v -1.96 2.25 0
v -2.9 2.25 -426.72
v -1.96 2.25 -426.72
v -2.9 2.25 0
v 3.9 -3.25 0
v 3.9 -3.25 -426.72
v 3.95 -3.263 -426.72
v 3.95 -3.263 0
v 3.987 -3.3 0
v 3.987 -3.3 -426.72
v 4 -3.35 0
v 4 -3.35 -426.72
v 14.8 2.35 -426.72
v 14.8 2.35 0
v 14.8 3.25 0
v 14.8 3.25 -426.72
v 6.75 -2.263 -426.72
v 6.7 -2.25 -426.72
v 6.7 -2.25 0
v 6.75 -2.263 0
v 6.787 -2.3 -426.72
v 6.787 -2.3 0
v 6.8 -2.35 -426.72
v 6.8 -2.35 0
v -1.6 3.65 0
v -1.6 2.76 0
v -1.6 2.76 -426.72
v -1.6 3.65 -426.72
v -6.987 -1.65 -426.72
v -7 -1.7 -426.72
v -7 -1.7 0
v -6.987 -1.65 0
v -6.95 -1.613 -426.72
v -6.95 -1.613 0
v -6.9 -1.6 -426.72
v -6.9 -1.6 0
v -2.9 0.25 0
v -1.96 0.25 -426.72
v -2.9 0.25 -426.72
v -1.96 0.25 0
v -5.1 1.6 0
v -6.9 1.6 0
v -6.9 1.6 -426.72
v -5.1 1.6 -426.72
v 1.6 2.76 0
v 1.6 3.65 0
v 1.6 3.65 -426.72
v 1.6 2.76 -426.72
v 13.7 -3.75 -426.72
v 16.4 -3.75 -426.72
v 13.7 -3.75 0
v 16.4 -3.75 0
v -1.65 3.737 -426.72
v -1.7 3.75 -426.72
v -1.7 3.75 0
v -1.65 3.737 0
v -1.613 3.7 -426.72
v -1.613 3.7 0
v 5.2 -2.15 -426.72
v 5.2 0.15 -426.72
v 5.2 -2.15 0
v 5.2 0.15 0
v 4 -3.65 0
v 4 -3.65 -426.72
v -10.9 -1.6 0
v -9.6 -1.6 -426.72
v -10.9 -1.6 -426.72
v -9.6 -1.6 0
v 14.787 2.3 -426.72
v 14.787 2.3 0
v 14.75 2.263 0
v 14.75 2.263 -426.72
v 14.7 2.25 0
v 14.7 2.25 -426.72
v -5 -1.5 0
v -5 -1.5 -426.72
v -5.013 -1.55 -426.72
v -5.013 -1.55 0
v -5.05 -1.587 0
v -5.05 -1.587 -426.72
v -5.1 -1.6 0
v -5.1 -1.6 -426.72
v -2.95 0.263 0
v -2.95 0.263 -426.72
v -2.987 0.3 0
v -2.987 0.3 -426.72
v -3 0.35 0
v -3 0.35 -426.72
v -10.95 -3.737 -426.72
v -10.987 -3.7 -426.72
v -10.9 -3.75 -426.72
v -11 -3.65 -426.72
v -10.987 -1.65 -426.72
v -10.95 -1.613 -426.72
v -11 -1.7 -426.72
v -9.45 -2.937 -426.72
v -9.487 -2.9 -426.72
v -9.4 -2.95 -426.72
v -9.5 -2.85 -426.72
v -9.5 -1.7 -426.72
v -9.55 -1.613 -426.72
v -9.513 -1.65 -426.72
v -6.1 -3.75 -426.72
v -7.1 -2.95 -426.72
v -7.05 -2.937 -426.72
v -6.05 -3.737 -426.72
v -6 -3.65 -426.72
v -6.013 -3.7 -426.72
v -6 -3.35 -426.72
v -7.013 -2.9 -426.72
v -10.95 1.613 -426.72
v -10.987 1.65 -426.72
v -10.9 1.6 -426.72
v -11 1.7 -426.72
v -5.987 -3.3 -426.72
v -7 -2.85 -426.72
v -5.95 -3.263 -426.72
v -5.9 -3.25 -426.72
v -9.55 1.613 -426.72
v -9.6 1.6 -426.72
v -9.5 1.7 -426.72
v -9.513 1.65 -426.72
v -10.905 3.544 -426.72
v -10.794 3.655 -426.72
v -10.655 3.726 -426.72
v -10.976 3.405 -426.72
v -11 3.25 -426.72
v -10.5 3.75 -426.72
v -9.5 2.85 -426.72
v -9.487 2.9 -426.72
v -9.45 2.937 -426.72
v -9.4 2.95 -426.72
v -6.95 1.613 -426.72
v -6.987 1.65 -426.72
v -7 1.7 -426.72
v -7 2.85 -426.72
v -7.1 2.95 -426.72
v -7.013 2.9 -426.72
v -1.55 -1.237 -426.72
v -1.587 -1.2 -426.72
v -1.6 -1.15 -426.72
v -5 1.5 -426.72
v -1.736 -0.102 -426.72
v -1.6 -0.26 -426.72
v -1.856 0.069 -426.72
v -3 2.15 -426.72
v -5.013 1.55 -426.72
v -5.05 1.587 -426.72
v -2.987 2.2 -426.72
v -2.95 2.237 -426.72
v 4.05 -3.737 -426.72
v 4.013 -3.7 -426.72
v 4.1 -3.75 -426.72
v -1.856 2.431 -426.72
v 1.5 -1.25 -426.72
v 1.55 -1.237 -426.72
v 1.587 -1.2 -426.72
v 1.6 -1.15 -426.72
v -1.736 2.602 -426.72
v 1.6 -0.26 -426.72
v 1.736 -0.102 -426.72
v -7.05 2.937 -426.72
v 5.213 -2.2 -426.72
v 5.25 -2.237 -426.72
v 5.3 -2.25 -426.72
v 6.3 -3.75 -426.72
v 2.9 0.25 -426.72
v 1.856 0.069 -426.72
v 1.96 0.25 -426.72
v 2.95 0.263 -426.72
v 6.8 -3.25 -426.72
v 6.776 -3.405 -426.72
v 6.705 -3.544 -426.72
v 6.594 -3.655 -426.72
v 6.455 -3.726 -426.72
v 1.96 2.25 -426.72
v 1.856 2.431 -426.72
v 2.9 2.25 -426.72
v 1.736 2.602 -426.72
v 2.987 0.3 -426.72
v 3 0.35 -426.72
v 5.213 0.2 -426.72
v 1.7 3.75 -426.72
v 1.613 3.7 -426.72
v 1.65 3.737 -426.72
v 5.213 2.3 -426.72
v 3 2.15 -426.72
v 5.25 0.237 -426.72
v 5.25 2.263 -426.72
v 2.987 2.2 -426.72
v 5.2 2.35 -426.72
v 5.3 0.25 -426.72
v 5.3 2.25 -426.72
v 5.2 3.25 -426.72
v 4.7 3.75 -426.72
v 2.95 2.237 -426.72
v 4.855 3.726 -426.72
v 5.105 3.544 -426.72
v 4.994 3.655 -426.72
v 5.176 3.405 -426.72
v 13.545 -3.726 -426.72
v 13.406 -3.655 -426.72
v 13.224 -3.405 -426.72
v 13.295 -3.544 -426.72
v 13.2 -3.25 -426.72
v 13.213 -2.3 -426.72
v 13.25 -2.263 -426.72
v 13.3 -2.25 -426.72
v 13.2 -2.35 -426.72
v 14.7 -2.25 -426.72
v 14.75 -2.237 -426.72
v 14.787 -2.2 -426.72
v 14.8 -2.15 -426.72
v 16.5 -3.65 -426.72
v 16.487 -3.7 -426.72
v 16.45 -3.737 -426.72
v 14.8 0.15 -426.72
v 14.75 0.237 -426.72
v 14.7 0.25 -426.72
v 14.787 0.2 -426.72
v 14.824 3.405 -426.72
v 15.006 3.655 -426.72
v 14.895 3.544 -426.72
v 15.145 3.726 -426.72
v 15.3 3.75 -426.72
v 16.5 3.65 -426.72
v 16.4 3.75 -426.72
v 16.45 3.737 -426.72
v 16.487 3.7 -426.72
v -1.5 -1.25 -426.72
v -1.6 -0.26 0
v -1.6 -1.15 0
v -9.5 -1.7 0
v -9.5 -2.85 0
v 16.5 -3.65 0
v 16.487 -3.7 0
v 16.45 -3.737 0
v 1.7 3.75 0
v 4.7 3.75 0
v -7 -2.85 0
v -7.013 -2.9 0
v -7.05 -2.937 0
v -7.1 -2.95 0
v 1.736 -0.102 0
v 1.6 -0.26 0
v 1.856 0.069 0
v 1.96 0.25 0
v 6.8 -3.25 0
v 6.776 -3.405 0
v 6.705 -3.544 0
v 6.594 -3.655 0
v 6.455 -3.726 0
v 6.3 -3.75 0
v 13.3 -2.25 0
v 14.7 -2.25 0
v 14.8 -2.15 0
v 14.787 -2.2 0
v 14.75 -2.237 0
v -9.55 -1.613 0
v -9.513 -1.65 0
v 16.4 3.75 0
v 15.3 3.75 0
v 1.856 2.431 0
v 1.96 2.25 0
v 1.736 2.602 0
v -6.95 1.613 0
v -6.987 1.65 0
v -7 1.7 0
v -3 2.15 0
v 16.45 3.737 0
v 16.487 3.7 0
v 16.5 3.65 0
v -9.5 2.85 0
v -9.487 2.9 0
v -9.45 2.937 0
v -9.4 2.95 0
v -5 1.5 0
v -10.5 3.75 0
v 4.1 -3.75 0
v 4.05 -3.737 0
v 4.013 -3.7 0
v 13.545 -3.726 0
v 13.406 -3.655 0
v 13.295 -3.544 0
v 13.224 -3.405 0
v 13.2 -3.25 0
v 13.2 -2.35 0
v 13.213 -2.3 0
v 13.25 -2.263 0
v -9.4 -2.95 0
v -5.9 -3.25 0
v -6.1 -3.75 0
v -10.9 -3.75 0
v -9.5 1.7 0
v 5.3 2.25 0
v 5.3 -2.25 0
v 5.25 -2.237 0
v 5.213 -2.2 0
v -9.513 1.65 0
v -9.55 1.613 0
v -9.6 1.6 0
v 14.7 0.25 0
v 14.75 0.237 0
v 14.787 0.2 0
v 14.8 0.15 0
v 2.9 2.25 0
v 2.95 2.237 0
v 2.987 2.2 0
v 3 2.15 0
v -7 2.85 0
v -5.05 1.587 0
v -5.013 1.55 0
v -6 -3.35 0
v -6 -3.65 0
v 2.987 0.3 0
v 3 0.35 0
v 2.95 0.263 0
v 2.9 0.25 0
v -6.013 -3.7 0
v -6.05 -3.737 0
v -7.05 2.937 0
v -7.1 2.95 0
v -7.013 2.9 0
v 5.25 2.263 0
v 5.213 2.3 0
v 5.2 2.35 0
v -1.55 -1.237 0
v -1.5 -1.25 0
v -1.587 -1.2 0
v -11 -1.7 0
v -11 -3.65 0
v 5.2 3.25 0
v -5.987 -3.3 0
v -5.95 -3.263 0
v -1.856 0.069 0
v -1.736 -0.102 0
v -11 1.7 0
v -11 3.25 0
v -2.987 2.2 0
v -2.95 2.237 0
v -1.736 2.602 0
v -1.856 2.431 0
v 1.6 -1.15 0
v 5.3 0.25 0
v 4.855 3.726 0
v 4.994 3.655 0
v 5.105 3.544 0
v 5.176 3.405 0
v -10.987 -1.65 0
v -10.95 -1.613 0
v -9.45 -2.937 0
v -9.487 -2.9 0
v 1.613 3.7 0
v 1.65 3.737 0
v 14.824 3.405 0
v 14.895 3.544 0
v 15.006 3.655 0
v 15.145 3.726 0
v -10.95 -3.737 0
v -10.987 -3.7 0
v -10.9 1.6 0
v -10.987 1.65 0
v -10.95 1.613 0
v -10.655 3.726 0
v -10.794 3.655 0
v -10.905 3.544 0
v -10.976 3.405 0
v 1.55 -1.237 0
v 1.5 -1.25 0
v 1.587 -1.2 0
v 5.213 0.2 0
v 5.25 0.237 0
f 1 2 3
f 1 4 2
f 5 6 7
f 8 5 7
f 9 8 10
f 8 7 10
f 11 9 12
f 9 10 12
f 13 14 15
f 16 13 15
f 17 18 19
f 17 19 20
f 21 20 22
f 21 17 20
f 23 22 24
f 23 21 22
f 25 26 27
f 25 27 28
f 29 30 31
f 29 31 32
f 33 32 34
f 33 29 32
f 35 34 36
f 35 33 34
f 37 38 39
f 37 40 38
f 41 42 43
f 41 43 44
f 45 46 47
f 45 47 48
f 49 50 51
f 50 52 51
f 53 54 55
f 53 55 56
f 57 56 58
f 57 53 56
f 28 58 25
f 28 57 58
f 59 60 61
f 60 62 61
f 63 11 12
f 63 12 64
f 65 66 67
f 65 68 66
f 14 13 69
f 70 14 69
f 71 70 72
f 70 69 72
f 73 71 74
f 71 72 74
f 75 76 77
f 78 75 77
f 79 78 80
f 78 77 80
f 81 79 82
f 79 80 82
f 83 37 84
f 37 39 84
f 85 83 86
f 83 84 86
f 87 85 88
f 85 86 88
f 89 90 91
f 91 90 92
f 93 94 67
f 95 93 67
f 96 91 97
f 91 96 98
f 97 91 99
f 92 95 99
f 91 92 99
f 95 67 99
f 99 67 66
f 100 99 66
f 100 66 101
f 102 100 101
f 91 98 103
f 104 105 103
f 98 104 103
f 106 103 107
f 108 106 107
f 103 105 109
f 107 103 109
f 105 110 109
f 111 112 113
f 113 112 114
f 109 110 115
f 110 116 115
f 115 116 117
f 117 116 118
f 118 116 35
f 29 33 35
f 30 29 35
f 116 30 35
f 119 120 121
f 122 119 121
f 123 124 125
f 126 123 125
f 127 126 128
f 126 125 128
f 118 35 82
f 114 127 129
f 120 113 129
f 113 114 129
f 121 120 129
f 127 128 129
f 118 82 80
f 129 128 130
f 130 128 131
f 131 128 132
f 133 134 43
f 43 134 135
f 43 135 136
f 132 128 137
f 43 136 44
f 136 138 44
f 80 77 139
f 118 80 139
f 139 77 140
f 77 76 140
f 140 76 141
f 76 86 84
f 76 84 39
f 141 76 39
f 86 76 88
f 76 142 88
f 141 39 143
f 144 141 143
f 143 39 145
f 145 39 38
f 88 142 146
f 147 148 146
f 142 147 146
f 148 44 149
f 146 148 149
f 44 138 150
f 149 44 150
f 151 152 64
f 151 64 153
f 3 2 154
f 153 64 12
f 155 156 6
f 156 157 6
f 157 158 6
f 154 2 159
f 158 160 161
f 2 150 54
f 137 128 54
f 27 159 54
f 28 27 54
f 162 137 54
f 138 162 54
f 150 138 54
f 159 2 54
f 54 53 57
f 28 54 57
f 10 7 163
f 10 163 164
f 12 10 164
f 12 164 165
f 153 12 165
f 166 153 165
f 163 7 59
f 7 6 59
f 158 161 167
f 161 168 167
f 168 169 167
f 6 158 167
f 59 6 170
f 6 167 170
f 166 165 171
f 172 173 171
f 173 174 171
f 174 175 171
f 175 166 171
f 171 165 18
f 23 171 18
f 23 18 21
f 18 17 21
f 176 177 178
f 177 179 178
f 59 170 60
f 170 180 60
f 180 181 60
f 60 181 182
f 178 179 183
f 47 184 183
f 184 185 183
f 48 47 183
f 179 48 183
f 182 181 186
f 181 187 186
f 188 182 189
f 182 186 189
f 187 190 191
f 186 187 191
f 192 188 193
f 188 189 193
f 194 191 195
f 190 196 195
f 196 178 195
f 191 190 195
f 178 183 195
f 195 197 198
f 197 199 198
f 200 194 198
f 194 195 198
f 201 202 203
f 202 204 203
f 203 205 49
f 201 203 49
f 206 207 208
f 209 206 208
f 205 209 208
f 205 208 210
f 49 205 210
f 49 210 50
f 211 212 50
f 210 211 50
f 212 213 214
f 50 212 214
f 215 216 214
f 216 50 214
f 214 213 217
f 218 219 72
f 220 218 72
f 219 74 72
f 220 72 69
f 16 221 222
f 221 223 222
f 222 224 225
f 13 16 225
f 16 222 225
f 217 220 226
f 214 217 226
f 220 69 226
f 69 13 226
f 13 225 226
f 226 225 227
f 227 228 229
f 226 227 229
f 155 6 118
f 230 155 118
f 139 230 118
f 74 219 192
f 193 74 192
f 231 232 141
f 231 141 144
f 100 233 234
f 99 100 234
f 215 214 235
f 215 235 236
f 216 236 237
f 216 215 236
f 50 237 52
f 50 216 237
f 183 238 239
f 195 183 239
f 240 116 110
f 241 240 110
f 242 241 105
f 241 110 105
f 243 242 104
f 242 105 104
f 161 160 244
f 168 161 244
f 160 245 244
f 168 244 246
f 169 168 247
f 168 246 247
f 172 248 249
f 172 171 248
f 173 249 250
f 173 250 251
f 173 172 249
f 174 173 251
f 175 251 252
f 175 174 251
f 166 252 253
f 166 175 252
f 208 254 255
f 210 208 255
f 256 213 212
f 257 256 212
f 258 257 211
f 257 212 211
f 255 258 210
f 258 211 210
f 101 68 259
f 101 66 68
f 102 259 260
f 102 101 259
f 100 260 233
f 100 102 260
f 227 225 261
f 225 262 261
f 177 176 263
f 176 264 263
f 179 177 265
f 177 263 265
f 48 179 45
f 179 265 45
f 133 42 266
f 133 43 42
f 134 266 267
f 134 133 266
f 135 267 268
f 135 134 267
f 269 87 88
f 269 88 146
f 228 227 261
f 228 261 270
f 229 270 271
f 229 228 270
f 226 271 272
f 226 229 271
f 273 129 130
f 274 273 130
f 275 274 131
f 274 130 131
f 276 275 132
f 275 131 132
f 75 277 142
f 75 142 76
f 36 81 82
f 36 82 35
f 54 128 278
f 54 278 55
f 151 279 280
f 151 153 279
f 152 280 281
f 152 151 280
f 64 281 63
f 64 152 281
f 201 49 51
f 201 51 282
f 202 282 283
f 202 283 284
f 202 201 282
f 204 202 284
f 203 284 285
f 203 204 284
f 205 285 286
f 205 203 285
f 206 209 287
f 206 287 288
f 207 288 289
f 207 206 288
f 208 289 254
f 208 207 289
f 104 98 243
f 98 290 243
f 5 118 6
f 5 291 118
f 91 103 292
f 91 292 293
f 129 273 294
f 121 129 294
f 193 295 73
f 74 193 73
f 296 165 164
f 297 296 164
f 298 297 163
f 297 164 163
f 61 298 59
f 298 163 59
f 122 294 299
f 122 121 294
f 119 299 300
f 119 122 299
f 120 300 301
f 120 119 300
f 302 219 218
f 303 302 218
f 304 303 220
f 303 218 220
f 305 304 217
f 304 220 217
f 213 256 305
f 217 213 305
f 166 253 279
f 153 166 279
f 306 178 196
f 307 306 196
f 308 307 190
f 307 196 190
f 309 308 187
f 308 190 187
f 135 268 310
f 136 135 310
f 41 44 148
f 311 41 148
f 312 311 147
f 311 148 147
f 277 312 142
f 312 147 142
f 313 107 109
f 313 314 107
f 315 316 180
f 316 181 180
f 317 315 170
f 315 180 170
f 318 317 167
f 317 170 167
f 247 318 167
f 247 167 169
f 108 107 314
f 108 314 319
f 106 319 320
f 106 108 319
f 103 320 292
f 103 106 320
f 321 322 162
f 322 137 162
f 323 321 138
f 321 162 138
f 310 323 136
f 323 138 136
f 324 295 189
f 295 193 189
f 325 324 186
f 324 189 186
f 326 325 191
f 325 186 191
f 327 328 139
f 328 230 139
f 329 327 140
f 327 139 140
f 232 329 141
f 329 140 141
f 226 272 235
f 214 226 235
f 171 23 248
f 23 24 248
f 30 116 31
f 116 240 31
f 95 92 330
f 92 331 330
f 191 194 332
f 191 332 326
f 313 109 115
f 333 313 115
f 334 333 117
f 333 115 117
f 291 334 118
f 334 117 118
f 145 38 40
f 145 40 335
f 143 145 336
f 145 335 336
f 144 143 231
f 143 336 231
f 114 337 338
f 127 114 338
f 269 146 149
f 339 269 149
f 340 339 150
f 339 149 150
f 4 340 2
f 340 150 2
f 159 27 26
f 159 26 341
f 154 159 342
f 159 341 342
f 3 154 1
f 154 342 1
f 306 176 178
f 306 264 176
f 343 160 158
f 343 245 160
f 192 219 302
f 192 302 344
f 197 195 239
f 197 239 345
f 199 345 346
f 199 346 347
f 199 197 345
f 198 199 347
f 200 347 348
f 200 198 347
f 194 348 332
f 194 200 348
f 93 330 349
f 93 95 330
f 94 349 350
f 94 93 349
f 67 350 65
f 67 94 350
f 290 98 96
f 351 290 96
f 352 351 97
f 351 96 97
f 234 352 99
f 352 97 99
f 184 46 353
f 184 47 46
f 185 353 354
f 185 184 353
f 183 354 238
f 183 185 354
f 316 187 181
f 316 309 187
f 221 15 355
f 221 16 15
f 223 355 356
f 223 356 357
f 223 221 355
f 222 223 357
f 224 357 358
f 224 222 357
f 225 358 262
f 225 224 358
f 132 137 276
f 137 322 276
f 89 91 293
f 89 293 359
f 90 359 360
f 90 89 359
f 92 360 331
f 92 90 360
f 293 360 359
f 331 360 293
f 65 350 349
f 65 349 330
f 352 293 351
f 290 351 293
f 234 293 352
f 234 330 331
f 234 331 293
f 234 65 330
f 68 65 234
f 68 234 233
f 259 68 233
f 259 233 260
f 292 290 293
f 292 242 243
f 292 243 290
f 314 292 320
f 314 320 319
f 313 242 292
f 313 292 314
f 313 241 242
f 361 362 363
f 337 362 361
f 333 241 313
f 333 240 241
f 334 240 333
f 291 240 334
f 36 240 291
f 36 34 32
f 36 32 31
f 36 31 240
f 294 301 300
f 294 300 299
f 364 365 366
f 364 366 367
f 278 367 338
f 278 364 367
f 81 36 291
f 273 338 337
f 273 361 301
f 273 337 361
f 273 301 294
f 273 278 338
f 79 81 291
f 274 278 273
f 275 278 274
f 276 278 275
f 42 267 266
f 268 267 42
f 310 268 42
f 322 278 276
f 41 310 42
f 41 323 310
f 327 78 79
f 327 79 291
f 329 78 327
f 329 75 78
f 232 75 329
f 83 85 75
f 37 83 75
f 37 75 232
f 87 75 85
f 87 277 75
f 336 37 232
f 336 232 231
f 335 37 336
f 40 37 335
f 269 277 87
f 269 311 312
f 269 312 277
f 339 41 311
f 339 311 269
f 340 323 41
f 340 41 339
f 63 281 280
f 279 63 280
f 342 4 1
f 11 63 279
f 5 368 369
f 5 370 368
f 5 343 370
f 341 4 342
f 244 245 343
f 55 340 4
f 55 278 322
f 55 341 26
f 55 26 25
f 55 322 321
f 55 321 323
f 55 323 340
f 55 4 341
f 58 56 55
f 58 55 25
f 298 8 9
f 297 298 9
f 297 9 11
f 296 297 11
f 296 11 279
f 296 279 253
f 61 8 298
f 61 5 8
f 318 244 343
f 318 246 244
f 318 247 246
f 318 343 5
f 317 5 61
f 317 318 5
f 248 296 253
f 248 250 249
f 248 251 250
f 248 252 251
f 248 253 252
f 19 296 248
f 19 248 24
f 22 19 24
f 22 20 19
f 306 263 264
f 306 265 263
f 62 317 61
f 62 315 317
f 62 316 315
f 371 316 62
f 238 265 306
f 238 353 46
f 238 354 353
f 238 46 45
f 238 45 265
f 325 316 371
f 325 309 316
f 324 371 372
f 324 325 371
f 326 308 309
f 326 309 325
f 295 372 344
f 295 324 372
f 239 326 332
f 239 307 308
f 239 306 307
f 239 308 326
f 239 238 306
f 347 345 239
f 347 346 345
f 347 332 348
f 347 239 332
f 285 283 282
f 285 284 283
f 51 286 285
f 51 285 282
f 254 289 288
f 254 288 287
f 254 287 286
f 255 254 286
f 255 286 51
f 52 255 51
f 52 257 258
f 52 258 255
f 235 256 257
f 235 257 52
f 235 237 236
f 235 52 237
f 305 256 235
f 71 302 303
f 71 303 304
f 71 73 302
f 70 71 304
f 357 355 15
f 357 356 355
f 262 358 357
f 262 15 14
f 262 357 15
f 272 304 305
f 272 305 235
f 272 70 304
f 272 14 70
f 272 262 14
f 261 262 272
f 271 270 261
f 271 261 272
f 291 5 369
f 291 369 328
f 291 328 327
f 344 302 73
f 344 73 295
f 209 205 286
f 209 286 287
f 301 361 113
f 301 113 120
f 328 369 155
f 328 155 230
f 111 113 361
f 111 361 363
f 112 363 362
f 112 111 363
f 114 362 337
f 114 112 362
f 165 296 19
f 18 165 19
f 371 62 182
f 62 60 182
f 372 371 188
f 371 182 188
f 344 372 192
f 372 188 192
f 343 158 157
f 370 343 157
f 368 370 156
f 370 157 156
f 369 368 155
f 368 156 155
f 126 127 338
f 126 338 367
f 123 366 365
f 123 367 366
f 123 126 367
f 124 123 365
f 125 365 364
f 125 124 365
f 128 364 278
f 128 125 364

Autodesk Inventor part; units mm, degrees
ref_plane "YZ Plane" through (0, 0, 0) normal (1, 0, 0) x (0, 1, 0)
ref_plane "XZ Plane" through (0, 0, 0) normal (0, 1, 0) x (-1, 0, 0)
ref_plane "XY Plane" through (0, 0, 0) normal (0, 0, 1) x (1, 0, 0)
sketch "Rail_TypeB_Sketch" plane through (0, 0, 0) normal (0, 0, 1) x (1, 0, 0)
  line L0 (-11, 3.75) -> (-1.6, 3.75)
  line L1 (16.5, 3.75) -> (16.5, -3.75)
  line L2 (16.5, -3.75) -> (13.2, -3.75)
  line L3 (-11, -3.75) -> (-11, -1.6)
  arc A0 (-1.9596, 2.25) -> (-1.9596, 0.25) centre (0, 1.25) ccw construction
  line L4 (-11, 0) -> (16.5, 0) construction
  line L5 (0, 3.75) -> (0, -3.75) construction
  line L6 (-11, 1.6) -> (-9.5, 1.6)
  line L7 (-5, 1.6) -> (-5, -1.6)
  line L8 (-5, -1.6) -> (-7, -1.6)
  line L9 (-11, 1.6) -> (-11, 3.75)
  line L10 (-11, -1.6) -> (-11, 1.6) construction
  line L11 (-7, 2.95) -> (-9.5, 2.95)
  line L12 (-9.5, 2.95) -> (-9.5, 1.6)
  line L13 (-9.5, -2.95) -> (-7, -2.95)
  line L14 (-7, -2.95) -> (-7, -1.6)
  line L15 (-9.5, 1.6) -> (-7, 1.6) construction
  line L16 (-7, 1.6) -> (-5, 1.6)
  line L17 (-9.5, -1.6) -> (-11, -1.6)
  line L18 (-7, -1.6) -> (-9.5, -1.6) construction
  line L19 (-7, -1.6) -> (-7, 1.6) construction
  line L20 (-9.5, -1.6) -> (-9.5, -2.95)
  line L21 (-9.5, 1.6) -> (-9.5, -1.6) construction
  line L22 (-7, 1.6) -> (-7, 2.95)
  line L23 (-6, -3.75) -> (-6, -3.25)
  line L24 (-6, -3.25) -> (4, -3.25)
  line L25 (4, -3.25) -> (4, -3.75)
  line L26 (-6, -3.75) -> (-11, -3.75)
  line L27 (4, -3.75) -> (-6, -3.75) construction
  line L28 (1.6, -1.25) -> (-1.6, -1.25)
  line L29 (-1.6, -1.25) -> (-1.6, -0.26)
  line L30 (1.6, 3.75) -> (1.6, 2.76)
  line L31 (1.6, -1.25) -> (-1.6, 3.75) construction
  line L32 (-1.6, -1.25) -> (1.6, 3.75) construction
  line L33 (-3, 2.25) -> (-1.9596, 2.25)
  line L34 (3, 2.25) -> (3, 0.25)
  line L35 (3, 0.25) -> (1.9596, 0.25)
  line L36 (-3, 0.25) -> (-3, 2.25)
  line L37 (-3, 2.25) -> (3, 0.25) construction
  line L38 (3, 2.25) -> (-3, 0.25) construction
  arc A1 (-1.6, 2.76) -> (-1.9596, 2.25) centre (0, 1.25) ccw
  arc A2 (1.9596, 2.25) -> (1.6, 2.76) centre (0, 1.25) ccw
  arc A3 (1.6, 2.76) -> (-1.6, 2.76) centre (0, 1.25) ccw construction
  arc A4 (1.9596, 0.25) -> (1.9596, 2.25) centre (0, 1.25) ccw construction
  arc A5 (1.6, -0.26) -> (1.9596, 0.25) centre (0, 1.25) ccw
  arc A6 (-1.6, -0.26) -> (1.6, -0.26) centre (0, 1.25) ccw construction
  arc A7 (-1.9596, 0.25) -> (-1.6, -0.26) centre (0, 1.25) ccw
  line L39 (-1.9596, 2.25) -> (1.9596, 2.25) construction
  line L40 (-1.9596, 0.25) -> (-3, 0.25)
  line L41 (1.9596, 2.25) -> (3, 2.25)
  line L42 (1.9596, 0.25) -> (-1.9596, 0.25) construction
  line L43 (-1.6, 2.76) -> (-1.6, 3.75)
  line L44 (1.6, 2.76) -> (1.6, -0.26) construction
  line L45 (1.6, -0.26) -> (1.6, -1.25)
  line L46 (-1.6, -0.26) -> (-1.6, 2.76) construction
  line L47 (10, 3.75) -> (10, -3.75) construction
  line L48 (5.2, 3.75) -> (5.2, 2.25)
  line L49 (5.2, 2.25) -> (14.8, 2.25)
  line L50 (14.8, 2.25) -> (14.8, 3.75)
  line L51 (5.2, 3.75) -> (14.8, 3.75) construction
  line L52 (14.8, 3.75) -> (16.5, 3.75)
  line L53 (13.2, -3.75) -> (13.2, -2.25)
  line L54 (13.2, -2.25) -> (14.8, -2.25)
  line L55 (14.8, -2.25) -> (14.8, 0.25)
  line L56 (14.8, 0.25) -> (5.2, 0.25)
  line L57 (5.2, 0.25) -> (5.2, -2.25)
  line L58 (5.2, -2.25) -> (6.8, -2.25)
  line L59 (6.8, -2.25) -> (6.8, -3.75)
  line L60 (6.8, -3.75) -> (4, -3.75)
  line L61 (13.2, -3.75) -> (6.8, -3.75) construction
  line L62 (-1.6, 3.75) -> (0, 3.75) construction
  line L63 (0, 3.75) -> (1.6, 3.75) construction
  line L64 (1.6, 3.75) -> (5.2, 3.75)
  point P0 (0, 0)
  dimension "d0" = 27.5
  dimension "d1" = 7.5
  dimension "d3" = 3.75
  dimension "d5" = 4.4
  dimension "d6" = 2.5
  dimension "d8" = 16.5
  dimension "d9" = 6
  dimension "d10" = 3.2
  dimension "d11" = 1.6
  dimension "d12" = 11
  dimension "d13" = 1.5
  dimension "d14" = 4
  dimension "d15" = 5.9
  dimension "d16" = 2.95
  dimension "d17" = 0.5
  dimension "d18" = 10
  dimension "d19" = 5
  dimension "d20" = 3.2
  dimension "d21" = 5
  dimension "d22" = 6
  dimension "d23" = 2
  dimension "d24" = 10
  dimension "d25" = 9.6
  dimension "d26" = 4.8
  dimension "d27" = 6
  dimension "d28" = 1.5
  dimension "d29" = 4
  dimension "d30" = 6.4
  dimension "d31" = 3.2
  dimension "d32" = 9.6
  dimension "d33" = 4.8
extrude "Extrusion1" add sketch "Rail_TypeB_Sketch" against normal blind 426.72
fillet "Fillet1_0.5 mm" radius 0.5 5 edges at (-11, 3.75, -213.36) (5.2, 3.75, -213.36) (14.8, 3.75, -213.36) (6.8, -3.75, -213.36) (13.2, -3.75, -213.36)
fillet "Fillet2_0.1 mm" radius 0.1 35 edges at (-1.6, 3.75, -213.36) (1.6, 3.75, -213.36) (5.2, 2.25, -213.36) (14.8, 2.25, -213.36) (16.5, 3.75, -213.36) (16.5, -3.75, -213.36) (13.2, -2.25, -213.36) (14.8, -2.25, -213.36) (14.8, 0.25, -213.36) (5.2, 0.25, -213.36) (5.2, -2.25, -213.36) (6.8, -2.25, -213.36) (4, -3.75, -213.36) (4, -3.25, -213.36) (-6, -3.25, -213.36) (-6, -3.75, -213.36) (-11, -3.75, -213.36) (-11, -1.6, -213.36) (-9.5, -1.6, -213.36) (-9.5, -2.95, -213.36) (-7, -2.95, -213.36) (-7, -1.6, -213.36) (-5, -1.6, -213.36) (-5, 1.6, -213.36) (-7, 1.6, -213.36) (-7, 2.95, -213.36) (-9.5, 2.95, -213.36) (-9.5, 1.6, -213.36) (-11, 1.6, -213.36) (-3, 2.25, -213.36) (-3, 0.25, -213.36) (-1.6, -1.25, -213.36) (1.6, -1.25, -213.36) (3, 0.25, -213.36) (3, 2.25, -213.36)
equation "\"d3\" = 0.5 * d1"
equation "\"d11\" = 0.5 * d10"
equation "\"d16\" = 0.5 * d15"
equation "\"d26\" = 0.5 * d25"
equation "\"d31\" = 0.5 * d30"
equation "\"d32\" = d25"
equation "\"d33\" = 0.5 * d32"
properties part number "Rail_TypeB" material "Aluminum"
